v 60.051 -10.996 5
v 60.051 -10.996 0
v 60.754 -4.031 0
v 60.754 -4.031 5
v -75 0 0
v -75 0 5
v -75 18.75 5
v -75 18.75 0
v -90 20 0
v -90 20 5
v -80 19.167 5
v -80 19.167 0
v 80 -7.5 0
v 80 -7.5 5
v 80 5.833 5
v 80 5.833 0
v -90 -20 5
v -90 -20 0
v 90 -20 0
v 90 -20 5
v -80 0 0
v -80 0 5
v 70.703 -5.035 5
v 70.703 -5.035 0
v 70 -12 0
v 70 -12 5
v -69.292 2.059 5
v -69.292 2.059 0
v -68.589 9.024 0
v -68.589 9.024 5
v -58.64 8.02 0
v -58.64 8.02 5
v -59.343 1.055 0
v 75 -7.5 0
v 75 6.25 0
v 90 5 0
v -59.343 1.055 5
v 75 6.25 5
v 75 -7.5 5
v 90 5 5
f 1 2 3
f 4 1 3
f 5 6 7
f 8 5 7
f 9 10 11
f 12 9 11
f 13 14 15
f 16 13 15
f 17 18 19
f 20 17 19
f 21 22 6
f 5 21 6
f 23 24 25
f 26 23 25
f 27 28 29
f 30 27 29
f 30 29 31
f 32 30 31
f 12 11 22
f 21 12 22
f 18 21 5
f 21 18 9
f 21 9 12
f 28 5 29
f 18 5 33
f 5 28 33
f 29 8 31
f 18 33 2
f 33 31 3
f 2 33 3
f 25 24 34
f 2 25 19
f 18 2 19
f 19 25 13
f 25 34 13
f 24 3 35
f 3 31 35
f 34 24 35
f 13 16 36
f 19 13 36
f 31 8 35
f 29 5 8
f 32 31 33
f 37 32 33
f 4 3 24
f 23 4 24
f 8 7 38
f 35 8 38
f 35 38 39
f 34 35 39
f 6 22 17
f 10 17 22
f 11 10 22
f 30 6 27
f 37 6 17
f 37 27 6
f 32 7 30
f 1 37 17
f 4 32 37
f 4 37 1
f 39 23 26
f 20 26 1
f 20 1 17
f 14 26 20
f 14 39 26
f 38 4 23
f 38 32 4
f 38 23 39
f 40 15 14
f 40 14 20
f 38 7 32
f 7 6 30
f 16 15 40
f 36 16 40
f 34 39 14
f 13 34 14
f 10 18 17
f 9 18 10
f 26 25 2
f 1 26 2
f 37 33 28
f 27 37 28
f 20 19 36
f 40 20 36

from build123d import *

# Parameters (mm, degrees)
F0_W     = 180
F0_H     = 40
F1_DEPTH = 5
F3_DEPTH = 25
F5_DEPTH = 25
F7_DEPTH = 25


with BuildPart() as f1:
    # F0 (on Top) → F1 (new body)
    with BuildSketch(Plane.XY):
        Rectangle(F0_W, F0_H)
    extrude(amount=F1_DEPTH)

    # F2 (on face) → F3 (cut)
    with BuildSketch(Plane.XY.offset(5)):
        Polygon((90, 20), (-90, 20), (90, 5), align=None)
    extrude(amount=-F3_DEPTH, mode=Mode.SUBTRACT)

    # F4 (on face) → F5 (cut)
    with BuildSketch(Plane.XY.offset(5)):
        Polygon((-75, 18.75), (-80, 19.1666666667), (-80, 0), (-75, 0), align=None)
        Polygon((80, 5.8333333333), (75, 6.25), (75, -7.5), (80, -7.5), align=None)
    extrude(amount=-F5_DEPTH, mode=Mode.SUBTRACT)

    # F6 (on face) → F7 (cut)
    with BuildSketch(Plane(origin=(0, 0, 0), x_dir=(1, 0, 0), z_dir=(0, 0, -1))):
        Polygon((-59.3428026841, -1.0552439201), (-69.2922490445, -2.0594934524), (-68.5892743718, -9.0241059046), (-58.6398280115, -8.0198563723), align=None)
        Polygon((70, 12), (60.0505536397, 10.9957504677), (60.7535283123, 4.0311380155), (70.7029746726, 5.0353875478), align=None)
    extrude(amount=-F7_DEPTH, mode=Mode.SUBTRACT)


solid = f1.part
